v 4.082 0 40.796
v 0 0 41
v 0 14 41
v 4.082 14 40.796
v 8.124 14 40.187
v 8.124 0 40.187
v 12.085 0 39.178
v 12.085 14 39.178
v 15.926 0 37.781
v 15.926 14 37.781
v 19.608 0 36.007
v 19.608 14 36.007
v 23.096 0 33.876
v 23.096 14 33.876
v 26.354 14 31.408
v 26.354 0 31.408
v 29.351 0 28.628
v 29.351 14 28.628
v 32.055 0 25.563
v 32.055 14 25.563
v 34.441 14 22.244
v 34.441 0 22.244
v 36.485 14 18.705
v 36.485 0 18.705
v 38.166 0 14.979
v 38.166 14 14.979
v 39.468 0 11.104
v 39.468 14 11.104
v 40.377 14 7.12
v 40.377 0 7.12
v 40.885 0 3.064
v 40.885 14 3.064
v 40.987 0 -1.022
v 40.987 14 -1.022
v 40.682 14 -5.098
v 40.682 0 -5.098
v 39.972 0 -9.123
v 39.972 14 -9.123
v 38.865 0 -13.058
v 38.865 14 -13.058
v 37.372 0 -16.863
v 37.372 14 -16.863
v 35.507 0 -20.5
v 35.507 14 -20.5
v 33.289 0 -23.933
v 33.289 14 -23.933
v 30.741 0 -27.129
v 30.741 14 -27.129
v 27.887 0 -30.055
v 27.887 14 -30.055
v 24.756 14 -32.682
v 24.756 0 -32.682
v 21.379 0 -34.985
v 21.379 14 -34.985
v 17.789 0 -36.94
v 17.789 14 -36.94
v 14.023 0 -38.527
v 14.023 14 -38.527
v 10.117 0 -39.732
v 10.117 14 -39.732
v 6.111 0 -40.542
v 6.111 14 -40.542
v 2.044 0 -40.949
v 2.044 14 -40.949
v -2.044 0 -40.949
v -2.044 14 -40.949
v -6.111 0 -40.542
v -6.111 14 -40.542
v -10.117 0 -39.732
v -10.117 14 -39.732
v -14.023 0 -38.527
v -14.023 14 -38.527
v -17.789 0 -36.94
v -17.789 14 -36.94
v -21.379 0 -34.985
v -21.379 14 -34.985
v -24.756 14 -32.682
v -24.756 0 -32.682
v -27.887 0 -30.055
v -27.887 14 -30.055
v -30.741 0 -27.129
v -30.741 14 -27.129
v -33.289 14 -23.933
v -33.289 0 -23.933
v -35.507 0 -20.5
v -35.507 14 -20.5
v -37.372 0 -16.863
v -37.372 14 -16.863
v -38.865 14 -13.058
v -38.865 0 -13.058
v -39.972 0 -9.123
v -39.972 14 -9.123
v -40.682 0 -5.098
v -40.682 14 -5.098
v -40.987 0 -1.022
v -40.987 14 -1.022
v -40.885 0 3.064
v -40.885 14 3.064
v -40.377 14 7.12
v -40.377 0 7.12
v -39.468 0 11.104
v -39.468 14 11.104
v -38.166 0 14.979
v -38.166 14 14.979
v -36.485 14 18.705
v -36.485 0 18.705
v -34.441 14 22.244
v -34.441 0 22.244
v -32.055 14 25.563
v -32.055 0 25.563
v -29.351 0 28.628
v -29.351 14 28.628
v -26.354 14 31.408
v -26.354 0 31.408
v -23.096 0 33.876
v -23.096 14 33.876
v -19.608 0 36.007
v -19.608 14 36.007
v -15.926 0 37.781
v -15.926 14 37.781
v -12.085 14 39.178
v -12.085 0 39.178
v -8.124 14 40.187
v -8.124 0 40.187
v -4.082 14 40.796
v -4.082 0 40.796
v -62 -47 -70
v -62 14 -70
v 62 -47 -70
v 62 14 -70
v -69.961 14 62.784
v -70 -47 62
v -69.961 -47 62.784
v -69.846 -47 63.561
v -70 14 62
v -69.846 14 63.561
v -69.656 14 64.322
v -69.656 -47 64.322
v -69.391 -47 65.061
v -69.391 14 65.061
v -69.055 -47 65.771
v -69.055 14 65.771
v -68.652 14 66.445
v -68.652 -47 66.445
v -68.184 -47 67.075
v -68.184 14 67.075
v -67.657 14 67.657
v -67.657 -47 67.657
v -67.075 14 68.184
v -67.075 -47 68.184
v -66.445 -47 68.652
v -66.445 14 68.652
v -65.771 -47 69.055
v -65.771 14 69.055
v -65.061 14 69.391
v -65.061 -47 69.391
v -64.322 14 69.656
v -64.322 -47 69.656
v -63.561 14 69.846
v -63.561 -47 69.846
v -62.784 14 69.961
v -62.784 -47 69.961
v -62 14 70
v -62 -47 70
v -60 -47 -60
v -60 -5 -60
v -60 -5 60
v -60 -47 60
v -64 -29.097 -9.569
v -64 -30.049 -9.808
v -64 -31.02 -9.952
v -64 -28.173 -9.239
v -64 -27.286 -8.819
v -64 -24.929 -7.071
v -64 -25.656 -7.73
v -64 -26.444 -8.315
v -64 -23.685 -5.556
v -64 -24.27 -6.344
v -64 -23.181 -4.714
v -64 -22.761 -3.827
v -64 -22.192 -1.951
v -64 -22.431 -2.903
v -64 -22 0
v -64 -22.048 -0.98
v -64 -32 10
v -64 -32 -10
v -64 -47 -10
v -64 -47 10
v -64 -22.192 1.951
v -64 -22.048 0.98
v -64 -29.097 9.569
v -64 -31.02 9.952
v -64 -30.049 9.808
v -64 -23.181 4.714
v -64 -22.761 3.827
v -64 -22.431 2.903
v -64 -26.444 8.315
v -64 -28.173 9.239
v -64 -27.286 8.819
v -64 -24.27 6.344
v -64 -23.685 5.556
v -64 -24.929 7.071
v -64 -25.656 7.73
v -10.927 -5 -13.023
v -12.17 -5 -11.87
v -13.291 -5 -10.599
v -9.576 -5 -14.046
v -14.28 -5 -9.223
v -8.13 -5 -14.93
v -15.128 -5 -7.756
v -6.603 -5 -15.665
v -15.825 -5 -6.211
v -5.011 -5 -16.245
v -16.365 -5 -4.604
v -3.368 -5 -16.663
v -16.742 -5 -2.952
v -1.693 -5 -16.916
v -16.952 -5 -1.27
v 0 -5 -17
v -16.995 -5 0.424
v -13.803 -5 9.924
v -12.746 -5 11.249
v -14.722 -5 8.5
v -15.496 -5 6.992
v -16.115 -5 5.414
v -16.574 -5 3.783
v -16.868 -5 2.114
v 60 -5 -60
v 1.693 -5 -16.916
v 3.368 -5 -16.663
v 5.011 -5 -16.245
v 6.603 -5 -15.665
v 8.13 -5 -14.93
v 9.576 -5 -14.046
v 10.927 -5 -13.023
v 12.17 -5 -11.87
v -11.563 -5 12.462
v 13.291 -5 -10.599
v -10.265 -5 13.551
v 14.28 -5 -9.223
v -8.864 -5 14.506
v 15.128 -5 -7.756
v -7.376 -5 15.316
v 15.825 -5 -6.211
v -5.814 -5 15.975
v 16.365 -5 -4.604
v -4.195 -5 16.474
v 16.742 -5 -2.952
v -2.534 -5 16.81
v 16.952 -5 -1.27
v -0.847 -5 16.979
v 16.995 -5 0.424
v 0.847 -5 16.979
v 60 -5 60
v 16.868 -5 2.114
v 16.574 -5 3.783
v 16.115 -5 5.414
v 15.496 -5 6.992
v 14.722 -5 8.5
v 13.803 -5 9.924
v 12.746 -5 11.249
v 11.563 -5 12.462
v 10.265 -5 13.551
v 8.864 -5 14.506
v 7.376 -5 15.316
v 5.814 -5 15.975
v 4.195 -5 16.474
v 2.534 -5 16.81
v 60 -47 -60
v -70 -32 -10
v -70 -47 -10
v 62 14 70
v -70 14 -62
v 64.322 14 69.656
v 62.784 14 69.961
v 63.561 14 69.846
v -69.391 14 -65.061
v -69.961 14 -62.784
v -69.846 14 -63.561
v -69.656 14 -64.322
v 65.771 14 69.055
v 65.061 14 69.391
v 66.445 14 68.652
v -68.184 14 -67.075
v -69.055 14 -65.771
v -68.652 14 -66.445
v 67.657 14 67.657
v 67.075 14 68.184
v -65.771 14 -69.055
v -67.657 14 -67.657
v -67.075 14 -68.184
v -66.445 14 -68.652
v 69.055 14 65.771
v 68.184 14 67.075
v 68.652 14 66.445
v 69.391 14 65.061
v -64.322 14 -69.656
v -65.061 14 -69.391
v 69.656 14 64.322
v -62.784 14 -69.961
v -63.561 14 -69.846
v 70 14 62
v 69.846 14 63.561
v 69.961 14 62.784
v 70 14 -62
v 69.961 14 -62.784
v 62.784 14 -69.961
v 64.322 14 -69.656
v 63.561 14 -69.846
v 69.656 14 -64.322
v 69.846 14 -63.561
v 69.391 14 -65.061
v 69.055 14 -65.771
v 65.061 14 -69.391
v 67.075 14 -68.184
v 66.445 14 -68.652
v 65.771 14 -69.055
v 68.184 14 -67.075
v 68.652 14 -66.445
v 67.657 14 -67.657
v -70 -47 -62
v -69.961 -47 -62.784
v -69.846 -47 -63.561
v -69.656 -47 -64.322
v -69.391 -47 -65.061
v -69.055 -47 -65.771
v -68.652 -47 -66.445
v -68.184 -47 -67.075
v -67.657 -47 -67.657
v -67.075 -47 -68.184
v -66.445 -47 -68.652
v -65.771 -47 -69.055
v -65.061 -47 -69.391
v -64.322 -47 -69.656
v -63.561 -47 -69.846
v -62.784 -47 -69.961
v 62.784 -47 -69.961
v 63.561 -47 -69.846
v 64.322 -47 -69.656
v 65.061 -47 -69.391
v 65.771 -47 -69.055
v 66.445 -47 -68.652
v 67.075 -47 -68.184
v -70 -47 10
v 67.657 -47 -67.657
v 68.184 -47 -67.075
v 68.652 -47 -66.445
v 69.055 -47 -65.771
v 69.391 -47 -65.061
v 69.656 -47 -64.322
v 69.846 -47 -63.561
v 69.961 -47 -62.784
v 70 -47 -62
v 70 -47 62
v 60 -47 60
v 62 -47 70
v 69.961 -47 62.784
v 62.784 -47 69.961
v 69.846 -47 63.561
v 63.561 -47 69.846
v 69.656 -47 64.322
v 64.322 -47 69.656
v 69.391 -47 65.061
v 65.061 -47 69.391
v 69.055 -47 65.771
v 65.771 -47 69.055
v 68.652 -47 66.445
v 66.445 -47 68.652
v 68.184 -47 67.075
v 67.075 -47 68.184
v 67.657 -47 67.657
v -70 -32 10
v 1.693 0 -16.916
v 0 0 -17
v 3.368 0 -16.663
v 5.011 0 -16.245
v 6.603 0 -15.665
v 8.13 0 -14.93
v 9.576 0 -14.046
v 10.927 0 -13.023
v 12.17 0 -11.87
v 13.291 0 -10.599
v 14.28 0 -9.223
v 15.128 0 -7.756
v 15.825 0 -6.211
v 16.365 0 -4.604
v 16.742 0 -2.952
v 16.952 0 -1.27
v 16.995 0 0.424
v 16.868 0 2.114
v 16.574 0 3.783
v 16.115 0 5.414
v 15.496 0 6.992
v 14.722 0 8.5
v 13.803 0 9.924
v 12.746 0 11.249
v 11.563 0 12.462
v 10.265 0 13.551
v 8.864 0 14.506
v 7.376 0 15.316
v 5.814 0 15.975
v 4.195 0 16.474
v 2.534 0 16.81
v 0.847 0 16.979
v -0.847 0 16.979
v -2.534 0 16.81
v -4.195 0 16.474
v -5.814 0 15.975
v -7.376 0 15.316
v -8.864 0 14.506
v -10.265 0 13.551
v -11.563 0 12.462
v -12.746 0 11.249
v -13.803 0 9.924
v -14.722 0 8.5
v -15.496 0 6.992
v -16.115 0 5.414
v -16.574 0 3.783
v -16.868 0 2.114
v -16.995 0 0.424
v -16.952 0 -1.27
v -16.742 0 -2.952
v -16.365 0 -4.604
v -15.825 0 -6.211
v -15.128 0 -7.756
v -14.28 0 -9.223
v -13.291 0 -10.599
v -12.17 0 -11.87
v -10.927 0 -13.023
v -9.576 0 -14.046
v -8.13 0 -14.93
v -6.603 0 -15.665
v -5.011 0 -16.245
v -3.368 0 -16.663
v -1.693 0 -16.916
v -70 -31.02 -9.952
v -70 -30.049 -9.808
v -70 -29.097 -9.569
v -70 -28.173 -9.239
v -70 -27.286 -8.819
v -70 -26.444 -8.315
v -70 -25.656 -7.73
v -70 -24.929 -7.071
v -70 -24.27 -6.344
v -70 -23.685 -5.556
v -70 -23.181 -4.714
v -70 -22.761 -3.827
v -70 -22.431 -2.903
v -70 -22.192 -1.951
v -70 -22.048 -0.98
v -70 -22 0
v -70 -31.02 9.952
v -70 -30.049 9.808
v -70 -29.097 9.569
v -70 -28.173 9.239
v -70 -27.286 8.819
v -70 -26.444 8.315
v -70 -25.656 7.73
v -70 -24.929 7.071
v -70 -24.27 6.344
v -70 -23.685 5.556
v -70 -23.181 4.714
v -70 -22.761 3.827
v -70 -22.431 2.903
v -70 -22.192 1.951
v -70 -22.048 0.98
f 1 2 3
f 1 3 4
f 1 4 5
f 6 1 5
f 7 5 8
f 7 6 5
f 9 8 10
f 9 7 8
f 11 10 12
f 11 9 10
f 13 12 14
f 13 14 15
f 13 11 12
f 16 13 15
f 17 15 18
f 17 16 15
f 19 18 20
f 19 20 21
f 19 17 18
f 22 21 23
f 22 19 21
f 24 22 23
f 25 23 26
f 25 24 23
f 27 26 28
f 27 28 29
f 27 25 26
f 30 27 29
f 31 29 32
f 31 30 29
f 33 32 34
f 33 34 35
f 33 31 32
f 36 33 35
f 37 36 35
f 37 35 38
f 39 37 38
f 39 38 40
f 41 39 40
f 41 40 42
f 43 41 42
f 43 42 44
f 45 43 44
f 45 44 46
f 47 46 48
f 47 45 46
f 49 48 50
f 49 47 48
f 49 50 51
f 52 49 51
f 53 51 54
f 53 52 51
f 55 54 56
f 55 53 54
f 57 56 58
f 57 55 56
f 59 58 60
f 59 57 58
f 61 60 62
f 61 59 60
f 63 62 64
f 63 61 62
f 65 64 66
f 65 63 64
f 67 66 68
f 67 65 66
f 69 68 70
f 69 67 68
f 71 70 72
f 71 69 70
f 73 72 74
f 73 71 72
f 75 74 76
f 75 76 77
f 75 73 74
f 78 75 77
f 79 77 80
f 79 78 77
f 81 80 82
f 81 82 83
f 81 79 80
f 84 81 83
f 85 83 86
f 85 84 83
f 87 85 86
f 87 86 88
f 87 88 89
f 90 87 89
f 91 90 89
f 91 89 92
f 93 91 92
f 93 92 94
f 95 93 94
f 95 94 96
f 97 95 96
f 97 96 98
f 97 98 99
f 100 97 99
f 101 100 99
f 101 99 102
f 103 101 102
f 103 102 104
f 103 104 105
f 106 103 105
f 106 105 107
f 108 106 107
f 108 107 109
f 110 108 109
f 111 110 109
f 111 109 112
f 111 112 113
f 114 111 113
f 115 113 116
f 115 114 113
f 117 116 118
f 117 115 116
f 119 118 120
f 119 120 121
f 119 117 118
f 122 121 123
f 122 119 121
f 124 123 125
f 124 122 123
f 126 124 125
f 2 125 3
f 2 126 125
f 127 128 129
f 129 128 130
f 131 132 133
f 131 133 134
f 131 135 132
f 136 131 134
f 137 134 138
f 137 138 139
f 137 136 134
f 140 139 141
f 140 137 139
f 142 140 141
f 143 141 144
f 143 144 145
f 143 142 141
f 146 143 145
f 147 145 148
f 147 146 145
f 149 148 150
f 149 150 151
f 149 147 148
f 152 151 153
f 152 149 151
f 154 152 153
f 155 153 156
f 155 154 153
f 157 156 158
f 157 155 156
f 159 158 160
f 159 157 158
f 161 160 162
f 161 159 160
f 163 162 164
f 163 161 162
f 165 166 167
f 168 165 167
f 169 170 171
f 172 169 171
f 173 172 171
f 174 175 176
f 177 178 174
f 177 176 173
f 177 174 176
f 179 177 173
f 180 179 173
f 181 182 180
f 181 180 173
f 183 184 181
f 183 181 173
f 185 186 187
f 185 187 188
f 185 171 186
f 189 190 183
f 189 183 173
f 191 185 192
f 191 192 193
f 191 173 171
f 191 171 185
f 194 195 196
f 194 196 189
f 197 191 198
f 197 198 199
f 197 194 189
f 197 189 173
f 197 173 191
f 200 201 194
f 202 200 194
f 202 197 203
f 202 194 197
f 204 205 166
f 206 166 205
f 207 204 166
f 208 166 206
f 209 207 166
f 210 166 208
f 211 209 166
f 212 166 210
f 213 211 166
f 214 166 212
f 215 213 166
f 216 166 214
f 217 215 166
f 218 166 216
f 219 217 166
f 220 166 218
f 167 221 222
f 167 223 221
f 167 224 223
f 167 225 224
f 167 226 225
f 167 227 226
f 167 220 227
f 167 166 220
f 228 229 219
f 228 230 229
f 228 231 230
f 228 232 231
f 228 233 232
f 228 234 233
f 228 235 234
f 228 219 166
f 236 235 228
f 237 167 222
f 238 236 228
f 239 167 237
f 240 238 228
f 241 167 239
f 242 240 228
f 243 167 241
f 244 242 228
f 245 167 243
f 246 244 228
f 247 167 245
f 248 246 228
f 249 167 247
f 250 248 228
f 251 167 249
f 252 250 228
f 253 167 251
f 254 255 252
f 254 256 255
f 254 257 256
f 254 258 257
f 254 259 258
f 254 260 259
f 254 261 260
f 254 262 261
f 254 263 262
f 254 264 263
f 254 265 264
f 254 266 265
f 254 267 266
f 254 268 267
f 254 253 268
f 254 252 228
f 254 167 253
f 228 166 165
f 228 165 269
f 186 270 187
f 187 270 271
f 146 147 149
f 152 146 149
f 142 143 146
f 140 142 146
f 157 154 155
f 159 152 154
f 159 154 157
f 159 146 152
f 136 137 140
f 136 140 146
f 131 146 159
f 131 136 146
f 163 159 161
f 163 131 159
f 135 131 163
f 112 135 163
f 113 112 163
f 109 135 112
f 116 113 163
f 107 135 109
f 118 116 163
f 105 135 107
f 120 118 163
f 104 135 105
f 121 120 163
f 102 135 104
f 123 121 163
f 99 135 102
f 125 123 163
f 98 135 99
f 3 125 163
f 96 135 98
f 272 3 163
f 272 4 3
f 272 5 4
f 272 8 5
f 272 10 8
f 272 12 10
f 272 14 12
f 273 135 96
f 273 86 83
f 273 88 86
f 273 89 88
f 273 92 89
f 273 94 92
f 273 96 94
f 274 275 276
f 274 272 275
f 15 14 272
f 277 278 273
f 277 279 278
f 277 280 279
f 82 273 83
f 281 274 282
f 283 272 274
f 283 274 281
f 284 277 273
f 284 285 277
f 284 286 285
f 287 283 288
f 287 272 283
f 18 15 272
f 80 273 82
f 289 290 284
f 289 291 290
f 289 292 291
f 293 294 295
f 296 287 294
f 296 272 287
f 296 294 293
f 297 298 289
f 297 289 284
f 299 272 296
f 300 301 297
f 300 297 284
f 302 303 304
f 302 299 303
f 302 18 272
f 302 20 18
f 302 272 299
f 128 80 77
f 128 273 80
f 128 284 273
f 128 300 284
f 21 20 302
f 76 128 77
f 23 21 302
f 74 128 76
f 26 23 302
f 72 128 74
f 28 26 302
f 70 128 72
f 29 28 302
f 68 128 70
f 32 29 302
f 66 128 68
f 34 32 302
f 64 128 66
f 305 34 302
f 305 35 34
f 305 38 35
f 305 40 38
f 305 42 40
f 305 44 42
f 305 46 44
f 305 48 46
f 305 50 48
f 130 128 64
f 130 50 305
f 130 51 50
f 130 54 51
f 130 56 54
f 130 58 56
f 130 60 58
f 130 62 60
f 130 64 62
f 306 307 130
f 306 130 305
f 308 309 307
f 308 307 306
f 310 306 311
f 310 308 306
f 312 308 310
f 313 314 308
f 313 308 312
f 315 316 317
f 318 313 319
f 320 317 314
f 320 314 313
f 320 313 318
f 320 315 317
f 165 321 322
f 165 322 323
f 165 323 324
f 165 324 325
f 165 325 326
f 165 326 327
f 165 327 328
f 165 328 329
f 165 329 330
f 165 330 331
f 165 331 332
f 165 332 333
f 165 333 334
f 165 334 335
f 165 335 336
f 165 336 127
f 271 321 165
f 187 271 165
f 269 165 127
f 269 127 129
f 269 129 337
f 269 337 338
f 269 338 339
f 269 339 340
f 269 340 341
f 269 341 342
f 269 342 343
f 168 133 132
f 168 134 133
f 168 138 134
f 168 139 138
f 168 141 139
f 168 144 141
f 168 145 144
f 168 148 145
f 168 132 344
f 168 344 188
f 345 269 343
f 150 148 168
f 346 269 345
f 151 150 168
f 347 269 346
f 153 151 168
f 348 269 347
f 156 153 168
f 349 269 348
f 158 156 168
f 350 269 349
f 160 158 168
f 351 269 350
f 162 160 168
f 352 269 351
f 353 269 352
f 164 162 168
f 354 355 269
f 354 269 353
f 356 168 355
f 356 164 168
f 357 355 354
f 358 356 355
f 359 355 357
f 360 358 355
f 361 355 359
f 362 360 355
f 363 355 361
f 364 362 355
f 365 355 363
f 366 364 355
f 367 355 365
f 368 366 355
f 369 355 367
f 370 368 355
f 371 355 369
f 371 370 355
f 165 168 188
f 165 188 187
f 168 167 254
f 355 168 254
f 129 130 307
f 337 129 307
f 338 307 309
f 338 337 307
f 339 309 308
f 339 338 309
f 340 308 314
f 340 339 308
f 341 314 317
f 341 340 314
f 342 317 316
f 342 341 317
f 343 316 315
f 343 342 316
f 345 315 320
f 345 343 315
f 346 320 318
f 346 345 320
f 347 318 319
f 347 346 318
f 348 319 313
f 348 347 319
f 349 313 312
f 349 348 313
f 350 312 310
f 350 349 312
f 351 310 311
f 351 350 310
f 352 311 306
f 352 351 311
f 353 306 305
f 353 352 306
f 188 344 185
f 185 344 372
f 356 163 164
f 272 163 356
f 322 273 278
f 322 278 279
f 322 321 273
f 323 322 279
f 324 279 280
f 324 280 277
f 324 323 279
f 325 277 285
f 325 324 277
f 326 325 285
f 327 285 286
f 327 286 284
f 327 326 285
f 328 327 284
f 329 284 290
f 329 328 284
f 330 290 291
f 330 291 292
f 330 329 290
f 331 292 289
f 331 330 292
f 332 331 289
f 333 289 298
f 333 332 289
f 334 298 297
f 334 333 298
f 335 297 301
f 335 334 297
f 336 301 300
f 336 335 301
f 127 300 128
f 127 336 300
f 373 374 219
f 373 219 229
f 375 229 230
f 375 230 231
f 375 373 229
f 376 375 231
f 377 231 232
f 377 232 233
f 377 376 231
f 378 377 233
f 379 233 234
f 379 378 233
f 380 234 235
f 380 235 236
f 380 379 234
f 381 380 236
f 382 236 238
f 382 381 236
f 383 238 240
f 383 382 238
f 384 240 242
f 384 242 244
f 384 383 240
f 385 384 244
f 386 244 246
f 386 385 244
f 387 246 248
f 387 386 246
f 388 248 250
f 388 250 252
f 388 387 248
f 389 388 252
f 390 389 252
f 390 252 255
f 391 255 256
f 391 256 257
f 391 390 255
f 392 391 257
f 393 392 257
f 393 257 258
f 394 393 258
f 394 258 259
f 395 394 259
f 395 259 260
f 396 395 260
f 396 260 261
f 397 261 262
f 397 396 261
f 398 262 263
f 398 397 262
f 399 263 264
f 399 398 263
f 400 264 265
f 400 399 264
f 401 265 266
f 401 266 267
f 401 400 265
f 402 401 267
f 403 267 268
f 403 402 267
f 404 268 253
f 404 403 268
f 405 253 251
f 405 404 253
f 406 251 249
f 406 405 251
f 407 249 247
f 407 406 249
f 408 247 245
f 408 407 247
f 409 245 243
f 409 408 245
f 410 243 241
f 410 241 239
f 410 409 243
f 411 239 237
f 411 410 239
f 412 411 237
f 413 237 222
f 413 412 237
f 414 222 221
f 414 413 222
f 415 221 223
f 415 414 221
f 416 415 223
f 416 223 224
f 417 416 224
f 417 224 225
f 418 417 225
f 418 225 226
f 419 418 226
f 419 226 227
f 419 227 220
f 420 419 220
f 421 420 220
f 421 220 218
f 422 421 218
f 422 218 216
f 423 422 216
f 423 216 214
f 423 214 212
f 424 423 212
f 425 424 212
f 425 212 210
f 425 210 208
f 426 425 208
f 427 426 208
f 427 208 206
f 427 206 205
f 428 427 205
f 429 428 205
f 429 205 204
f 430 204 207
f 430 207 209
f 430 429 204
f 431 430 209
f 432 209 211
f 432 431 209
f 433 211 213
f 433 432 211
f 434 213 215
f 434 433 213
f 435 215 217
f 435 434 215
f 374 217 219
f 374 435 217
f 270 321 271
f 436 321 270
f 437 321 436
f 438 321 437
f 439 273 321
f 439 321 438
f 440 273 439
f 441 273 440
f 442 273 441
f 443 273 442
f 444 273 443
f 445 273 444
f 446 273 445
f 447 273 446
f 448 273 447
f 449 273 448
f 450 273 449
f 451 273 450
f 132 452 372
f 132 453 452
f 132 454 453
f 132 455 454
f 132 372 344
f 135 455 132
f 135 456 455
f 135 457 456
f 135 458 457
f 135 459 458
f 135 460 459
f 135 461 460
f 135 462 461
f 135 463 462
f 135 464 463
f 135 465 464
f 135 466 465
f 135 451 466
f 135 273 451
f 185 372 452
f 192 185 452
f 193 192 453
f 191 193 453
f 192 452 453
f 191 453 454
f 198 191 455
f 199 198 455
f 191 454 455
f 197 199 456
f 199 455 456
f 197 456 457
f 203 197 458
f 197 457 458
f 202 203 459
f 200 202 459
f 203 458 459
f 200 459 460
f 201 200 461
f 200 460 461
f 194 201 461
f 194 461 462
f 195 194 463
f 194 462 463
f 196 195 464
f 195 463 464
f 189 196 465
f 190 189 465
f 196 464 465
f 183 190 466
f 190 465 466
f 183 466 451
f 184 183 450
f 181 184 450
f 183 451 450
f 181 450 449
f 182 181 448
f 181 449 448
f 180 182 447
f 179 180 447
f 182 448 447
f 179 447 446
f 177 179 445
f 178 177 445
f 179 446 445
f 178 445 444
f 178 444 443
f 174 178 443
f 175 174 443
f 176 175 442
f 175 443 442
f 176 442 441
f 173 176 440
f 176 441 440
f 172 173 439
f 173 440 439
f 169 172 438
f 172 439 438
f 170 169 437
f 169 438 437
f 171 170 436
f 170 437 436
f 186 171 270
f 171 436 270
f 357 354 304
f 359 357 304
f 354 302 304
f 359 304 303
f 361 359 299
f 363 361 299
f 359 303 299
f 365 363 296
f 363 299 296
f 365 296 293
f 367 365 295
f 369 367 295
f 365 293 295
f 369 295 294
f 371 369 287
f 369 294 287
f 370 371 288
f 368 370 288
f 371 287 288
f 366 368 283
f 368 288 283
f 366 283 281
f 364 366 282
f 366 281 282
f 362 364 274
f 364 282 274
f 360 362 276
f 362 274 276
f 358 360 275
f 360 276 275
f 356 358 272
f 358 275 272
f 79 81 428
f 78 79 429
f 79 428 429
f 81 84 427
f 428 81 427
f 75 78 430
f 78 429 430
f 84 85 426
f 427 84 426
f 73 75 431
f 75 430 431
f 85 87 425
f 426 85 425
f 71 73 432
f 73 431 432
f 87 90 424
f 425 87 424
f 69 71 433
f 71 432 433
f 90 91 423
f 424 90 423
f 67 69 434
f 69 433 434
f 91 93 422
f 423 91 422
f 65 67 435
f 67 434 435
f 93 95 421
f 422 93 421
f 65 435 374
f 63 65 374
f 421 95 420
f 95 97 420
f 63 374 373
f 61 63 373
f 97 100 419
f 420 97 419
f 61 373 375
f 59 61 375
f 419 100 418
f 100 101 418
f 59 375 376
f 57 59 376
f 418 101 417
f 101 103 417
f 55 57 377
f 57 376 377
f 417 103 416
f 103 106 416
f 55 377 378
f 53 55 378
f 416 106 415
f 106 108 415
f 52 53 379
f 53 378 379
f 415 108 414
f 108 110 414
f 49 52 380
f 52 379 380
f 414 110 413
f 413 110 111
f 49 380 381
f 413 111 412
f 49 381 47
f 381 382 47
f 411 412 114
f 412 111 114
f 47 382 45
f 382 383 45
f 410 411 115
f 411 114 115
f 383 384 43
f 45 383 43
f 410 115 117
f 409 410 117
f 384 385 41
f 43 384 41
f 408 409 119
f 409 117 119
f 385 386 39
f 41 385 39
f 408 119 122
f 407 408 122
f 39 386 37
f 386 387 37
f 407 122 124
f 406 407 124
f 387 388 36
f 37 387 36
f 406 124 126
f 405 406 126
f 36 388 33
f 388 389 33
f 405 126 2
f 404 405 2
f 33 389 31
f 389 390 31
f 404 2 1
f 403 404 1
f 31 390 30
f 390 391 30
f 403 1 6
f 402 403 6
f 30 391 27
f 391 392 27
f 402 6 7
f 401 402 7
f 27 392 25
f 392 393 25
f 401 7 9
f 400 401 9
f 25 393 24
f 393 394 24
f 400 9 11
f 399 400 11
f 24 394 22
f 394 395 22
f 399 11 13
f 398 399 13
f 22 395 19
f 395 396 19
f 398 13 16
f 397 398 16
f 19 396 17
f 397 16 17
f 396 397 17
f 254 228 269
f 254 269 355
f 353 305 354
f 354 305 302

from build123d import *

# Parameters (mm, degrees)
SKETCH_1_W          = 140
SKETCH_1_H          = 140
SKETCH_1_R          = 41
EXTRUDE_1_DEPTH     = 14
SKETCH_3_W          = 140
SKETCH_3_H          = 140
SKETCH_3_R          = 17
EXTRUDE_2_DEPTH     = 5
SKETCH_4_W          = 140
SKETCH_4_H          = 140
SKETCH_4_W_2        = 120
SKETCH_4_H_2        = 120
EXTRUDE_3_DEPTH     = 42
FILLET_3_R          = 8
CUT_EXTRUDE_1_DEPTH = 6


with BuildPart() as part:
    # 草图1 → 凸台-拉伸1 (new body)
    with BuildSketch(Plane(origin=(0, 0, 0), x_dir=(1, 0, 0), z_dir=(0, 1, 0))):
        Rectangle(SKETCH_1_W, SKETCH_1_H)
        with Locations(Location((0, 0, 0), (0, 0, 270))):
            Circle(SKETCH_1_R, mode=Mode.SUBTRACT)
    extrude(amount=EXTRUDE_1_DEPTH)

    # 草图3 → 凸台-拉伸2 (add)
    with BuildSketch(Plane.XZ):
        Rectangle(SKETCH_3_W, SKETCH_3_H)
        with Locations(Location((0, 0, 0), (0, 0, 270))):
            Circle(SKETCH_3_R, mode=Mode.SUBTRACT)
    extrude(amount=EXTRUDE_2_DEPTH)

    # 草图4 → 凸台-拉伸3 (add)
    with BuildSketch(Plane.XZ.offset(5)):
        Rectangle(SKETCH_4_W, SKETCH_4_H)
        Rectangle(SKETCH_4_W_2, SKETCH_4_H_2, mode=Mode.SUBTRACT)
    extrude(amount=EXTRUDE_3_DEPTH)

    # 圆角3
    fillet_3_edges = [part.edges().sort_by_distance(p)[0] for p in [
        (70, -16.5, 70),
        (-70, -16.5, 70),
        (-70, -16.5, -70),
        (70, -16.5, -70),
    ]]
    fillet(fillet_3_edges, radius=FILLET_3_R)

    # 草图5 → 切除-拉伸1 (cut)
    with BuildSketch(Plane.ZY.offset(70)):
        with BuildLine():
            Line((-10, -32), (-10, -47))
            Line((-10, -47), (10, -47))
            Line((10, -47), (10, -32))
            ThreePointArc((10, -32), (0, -22), (-10, -32))
        make_face()
    extrude(amount=-CUT_EXTRUDE_1_DEPTH, mode=Mode.SUBTRACT)


solid = part.part
